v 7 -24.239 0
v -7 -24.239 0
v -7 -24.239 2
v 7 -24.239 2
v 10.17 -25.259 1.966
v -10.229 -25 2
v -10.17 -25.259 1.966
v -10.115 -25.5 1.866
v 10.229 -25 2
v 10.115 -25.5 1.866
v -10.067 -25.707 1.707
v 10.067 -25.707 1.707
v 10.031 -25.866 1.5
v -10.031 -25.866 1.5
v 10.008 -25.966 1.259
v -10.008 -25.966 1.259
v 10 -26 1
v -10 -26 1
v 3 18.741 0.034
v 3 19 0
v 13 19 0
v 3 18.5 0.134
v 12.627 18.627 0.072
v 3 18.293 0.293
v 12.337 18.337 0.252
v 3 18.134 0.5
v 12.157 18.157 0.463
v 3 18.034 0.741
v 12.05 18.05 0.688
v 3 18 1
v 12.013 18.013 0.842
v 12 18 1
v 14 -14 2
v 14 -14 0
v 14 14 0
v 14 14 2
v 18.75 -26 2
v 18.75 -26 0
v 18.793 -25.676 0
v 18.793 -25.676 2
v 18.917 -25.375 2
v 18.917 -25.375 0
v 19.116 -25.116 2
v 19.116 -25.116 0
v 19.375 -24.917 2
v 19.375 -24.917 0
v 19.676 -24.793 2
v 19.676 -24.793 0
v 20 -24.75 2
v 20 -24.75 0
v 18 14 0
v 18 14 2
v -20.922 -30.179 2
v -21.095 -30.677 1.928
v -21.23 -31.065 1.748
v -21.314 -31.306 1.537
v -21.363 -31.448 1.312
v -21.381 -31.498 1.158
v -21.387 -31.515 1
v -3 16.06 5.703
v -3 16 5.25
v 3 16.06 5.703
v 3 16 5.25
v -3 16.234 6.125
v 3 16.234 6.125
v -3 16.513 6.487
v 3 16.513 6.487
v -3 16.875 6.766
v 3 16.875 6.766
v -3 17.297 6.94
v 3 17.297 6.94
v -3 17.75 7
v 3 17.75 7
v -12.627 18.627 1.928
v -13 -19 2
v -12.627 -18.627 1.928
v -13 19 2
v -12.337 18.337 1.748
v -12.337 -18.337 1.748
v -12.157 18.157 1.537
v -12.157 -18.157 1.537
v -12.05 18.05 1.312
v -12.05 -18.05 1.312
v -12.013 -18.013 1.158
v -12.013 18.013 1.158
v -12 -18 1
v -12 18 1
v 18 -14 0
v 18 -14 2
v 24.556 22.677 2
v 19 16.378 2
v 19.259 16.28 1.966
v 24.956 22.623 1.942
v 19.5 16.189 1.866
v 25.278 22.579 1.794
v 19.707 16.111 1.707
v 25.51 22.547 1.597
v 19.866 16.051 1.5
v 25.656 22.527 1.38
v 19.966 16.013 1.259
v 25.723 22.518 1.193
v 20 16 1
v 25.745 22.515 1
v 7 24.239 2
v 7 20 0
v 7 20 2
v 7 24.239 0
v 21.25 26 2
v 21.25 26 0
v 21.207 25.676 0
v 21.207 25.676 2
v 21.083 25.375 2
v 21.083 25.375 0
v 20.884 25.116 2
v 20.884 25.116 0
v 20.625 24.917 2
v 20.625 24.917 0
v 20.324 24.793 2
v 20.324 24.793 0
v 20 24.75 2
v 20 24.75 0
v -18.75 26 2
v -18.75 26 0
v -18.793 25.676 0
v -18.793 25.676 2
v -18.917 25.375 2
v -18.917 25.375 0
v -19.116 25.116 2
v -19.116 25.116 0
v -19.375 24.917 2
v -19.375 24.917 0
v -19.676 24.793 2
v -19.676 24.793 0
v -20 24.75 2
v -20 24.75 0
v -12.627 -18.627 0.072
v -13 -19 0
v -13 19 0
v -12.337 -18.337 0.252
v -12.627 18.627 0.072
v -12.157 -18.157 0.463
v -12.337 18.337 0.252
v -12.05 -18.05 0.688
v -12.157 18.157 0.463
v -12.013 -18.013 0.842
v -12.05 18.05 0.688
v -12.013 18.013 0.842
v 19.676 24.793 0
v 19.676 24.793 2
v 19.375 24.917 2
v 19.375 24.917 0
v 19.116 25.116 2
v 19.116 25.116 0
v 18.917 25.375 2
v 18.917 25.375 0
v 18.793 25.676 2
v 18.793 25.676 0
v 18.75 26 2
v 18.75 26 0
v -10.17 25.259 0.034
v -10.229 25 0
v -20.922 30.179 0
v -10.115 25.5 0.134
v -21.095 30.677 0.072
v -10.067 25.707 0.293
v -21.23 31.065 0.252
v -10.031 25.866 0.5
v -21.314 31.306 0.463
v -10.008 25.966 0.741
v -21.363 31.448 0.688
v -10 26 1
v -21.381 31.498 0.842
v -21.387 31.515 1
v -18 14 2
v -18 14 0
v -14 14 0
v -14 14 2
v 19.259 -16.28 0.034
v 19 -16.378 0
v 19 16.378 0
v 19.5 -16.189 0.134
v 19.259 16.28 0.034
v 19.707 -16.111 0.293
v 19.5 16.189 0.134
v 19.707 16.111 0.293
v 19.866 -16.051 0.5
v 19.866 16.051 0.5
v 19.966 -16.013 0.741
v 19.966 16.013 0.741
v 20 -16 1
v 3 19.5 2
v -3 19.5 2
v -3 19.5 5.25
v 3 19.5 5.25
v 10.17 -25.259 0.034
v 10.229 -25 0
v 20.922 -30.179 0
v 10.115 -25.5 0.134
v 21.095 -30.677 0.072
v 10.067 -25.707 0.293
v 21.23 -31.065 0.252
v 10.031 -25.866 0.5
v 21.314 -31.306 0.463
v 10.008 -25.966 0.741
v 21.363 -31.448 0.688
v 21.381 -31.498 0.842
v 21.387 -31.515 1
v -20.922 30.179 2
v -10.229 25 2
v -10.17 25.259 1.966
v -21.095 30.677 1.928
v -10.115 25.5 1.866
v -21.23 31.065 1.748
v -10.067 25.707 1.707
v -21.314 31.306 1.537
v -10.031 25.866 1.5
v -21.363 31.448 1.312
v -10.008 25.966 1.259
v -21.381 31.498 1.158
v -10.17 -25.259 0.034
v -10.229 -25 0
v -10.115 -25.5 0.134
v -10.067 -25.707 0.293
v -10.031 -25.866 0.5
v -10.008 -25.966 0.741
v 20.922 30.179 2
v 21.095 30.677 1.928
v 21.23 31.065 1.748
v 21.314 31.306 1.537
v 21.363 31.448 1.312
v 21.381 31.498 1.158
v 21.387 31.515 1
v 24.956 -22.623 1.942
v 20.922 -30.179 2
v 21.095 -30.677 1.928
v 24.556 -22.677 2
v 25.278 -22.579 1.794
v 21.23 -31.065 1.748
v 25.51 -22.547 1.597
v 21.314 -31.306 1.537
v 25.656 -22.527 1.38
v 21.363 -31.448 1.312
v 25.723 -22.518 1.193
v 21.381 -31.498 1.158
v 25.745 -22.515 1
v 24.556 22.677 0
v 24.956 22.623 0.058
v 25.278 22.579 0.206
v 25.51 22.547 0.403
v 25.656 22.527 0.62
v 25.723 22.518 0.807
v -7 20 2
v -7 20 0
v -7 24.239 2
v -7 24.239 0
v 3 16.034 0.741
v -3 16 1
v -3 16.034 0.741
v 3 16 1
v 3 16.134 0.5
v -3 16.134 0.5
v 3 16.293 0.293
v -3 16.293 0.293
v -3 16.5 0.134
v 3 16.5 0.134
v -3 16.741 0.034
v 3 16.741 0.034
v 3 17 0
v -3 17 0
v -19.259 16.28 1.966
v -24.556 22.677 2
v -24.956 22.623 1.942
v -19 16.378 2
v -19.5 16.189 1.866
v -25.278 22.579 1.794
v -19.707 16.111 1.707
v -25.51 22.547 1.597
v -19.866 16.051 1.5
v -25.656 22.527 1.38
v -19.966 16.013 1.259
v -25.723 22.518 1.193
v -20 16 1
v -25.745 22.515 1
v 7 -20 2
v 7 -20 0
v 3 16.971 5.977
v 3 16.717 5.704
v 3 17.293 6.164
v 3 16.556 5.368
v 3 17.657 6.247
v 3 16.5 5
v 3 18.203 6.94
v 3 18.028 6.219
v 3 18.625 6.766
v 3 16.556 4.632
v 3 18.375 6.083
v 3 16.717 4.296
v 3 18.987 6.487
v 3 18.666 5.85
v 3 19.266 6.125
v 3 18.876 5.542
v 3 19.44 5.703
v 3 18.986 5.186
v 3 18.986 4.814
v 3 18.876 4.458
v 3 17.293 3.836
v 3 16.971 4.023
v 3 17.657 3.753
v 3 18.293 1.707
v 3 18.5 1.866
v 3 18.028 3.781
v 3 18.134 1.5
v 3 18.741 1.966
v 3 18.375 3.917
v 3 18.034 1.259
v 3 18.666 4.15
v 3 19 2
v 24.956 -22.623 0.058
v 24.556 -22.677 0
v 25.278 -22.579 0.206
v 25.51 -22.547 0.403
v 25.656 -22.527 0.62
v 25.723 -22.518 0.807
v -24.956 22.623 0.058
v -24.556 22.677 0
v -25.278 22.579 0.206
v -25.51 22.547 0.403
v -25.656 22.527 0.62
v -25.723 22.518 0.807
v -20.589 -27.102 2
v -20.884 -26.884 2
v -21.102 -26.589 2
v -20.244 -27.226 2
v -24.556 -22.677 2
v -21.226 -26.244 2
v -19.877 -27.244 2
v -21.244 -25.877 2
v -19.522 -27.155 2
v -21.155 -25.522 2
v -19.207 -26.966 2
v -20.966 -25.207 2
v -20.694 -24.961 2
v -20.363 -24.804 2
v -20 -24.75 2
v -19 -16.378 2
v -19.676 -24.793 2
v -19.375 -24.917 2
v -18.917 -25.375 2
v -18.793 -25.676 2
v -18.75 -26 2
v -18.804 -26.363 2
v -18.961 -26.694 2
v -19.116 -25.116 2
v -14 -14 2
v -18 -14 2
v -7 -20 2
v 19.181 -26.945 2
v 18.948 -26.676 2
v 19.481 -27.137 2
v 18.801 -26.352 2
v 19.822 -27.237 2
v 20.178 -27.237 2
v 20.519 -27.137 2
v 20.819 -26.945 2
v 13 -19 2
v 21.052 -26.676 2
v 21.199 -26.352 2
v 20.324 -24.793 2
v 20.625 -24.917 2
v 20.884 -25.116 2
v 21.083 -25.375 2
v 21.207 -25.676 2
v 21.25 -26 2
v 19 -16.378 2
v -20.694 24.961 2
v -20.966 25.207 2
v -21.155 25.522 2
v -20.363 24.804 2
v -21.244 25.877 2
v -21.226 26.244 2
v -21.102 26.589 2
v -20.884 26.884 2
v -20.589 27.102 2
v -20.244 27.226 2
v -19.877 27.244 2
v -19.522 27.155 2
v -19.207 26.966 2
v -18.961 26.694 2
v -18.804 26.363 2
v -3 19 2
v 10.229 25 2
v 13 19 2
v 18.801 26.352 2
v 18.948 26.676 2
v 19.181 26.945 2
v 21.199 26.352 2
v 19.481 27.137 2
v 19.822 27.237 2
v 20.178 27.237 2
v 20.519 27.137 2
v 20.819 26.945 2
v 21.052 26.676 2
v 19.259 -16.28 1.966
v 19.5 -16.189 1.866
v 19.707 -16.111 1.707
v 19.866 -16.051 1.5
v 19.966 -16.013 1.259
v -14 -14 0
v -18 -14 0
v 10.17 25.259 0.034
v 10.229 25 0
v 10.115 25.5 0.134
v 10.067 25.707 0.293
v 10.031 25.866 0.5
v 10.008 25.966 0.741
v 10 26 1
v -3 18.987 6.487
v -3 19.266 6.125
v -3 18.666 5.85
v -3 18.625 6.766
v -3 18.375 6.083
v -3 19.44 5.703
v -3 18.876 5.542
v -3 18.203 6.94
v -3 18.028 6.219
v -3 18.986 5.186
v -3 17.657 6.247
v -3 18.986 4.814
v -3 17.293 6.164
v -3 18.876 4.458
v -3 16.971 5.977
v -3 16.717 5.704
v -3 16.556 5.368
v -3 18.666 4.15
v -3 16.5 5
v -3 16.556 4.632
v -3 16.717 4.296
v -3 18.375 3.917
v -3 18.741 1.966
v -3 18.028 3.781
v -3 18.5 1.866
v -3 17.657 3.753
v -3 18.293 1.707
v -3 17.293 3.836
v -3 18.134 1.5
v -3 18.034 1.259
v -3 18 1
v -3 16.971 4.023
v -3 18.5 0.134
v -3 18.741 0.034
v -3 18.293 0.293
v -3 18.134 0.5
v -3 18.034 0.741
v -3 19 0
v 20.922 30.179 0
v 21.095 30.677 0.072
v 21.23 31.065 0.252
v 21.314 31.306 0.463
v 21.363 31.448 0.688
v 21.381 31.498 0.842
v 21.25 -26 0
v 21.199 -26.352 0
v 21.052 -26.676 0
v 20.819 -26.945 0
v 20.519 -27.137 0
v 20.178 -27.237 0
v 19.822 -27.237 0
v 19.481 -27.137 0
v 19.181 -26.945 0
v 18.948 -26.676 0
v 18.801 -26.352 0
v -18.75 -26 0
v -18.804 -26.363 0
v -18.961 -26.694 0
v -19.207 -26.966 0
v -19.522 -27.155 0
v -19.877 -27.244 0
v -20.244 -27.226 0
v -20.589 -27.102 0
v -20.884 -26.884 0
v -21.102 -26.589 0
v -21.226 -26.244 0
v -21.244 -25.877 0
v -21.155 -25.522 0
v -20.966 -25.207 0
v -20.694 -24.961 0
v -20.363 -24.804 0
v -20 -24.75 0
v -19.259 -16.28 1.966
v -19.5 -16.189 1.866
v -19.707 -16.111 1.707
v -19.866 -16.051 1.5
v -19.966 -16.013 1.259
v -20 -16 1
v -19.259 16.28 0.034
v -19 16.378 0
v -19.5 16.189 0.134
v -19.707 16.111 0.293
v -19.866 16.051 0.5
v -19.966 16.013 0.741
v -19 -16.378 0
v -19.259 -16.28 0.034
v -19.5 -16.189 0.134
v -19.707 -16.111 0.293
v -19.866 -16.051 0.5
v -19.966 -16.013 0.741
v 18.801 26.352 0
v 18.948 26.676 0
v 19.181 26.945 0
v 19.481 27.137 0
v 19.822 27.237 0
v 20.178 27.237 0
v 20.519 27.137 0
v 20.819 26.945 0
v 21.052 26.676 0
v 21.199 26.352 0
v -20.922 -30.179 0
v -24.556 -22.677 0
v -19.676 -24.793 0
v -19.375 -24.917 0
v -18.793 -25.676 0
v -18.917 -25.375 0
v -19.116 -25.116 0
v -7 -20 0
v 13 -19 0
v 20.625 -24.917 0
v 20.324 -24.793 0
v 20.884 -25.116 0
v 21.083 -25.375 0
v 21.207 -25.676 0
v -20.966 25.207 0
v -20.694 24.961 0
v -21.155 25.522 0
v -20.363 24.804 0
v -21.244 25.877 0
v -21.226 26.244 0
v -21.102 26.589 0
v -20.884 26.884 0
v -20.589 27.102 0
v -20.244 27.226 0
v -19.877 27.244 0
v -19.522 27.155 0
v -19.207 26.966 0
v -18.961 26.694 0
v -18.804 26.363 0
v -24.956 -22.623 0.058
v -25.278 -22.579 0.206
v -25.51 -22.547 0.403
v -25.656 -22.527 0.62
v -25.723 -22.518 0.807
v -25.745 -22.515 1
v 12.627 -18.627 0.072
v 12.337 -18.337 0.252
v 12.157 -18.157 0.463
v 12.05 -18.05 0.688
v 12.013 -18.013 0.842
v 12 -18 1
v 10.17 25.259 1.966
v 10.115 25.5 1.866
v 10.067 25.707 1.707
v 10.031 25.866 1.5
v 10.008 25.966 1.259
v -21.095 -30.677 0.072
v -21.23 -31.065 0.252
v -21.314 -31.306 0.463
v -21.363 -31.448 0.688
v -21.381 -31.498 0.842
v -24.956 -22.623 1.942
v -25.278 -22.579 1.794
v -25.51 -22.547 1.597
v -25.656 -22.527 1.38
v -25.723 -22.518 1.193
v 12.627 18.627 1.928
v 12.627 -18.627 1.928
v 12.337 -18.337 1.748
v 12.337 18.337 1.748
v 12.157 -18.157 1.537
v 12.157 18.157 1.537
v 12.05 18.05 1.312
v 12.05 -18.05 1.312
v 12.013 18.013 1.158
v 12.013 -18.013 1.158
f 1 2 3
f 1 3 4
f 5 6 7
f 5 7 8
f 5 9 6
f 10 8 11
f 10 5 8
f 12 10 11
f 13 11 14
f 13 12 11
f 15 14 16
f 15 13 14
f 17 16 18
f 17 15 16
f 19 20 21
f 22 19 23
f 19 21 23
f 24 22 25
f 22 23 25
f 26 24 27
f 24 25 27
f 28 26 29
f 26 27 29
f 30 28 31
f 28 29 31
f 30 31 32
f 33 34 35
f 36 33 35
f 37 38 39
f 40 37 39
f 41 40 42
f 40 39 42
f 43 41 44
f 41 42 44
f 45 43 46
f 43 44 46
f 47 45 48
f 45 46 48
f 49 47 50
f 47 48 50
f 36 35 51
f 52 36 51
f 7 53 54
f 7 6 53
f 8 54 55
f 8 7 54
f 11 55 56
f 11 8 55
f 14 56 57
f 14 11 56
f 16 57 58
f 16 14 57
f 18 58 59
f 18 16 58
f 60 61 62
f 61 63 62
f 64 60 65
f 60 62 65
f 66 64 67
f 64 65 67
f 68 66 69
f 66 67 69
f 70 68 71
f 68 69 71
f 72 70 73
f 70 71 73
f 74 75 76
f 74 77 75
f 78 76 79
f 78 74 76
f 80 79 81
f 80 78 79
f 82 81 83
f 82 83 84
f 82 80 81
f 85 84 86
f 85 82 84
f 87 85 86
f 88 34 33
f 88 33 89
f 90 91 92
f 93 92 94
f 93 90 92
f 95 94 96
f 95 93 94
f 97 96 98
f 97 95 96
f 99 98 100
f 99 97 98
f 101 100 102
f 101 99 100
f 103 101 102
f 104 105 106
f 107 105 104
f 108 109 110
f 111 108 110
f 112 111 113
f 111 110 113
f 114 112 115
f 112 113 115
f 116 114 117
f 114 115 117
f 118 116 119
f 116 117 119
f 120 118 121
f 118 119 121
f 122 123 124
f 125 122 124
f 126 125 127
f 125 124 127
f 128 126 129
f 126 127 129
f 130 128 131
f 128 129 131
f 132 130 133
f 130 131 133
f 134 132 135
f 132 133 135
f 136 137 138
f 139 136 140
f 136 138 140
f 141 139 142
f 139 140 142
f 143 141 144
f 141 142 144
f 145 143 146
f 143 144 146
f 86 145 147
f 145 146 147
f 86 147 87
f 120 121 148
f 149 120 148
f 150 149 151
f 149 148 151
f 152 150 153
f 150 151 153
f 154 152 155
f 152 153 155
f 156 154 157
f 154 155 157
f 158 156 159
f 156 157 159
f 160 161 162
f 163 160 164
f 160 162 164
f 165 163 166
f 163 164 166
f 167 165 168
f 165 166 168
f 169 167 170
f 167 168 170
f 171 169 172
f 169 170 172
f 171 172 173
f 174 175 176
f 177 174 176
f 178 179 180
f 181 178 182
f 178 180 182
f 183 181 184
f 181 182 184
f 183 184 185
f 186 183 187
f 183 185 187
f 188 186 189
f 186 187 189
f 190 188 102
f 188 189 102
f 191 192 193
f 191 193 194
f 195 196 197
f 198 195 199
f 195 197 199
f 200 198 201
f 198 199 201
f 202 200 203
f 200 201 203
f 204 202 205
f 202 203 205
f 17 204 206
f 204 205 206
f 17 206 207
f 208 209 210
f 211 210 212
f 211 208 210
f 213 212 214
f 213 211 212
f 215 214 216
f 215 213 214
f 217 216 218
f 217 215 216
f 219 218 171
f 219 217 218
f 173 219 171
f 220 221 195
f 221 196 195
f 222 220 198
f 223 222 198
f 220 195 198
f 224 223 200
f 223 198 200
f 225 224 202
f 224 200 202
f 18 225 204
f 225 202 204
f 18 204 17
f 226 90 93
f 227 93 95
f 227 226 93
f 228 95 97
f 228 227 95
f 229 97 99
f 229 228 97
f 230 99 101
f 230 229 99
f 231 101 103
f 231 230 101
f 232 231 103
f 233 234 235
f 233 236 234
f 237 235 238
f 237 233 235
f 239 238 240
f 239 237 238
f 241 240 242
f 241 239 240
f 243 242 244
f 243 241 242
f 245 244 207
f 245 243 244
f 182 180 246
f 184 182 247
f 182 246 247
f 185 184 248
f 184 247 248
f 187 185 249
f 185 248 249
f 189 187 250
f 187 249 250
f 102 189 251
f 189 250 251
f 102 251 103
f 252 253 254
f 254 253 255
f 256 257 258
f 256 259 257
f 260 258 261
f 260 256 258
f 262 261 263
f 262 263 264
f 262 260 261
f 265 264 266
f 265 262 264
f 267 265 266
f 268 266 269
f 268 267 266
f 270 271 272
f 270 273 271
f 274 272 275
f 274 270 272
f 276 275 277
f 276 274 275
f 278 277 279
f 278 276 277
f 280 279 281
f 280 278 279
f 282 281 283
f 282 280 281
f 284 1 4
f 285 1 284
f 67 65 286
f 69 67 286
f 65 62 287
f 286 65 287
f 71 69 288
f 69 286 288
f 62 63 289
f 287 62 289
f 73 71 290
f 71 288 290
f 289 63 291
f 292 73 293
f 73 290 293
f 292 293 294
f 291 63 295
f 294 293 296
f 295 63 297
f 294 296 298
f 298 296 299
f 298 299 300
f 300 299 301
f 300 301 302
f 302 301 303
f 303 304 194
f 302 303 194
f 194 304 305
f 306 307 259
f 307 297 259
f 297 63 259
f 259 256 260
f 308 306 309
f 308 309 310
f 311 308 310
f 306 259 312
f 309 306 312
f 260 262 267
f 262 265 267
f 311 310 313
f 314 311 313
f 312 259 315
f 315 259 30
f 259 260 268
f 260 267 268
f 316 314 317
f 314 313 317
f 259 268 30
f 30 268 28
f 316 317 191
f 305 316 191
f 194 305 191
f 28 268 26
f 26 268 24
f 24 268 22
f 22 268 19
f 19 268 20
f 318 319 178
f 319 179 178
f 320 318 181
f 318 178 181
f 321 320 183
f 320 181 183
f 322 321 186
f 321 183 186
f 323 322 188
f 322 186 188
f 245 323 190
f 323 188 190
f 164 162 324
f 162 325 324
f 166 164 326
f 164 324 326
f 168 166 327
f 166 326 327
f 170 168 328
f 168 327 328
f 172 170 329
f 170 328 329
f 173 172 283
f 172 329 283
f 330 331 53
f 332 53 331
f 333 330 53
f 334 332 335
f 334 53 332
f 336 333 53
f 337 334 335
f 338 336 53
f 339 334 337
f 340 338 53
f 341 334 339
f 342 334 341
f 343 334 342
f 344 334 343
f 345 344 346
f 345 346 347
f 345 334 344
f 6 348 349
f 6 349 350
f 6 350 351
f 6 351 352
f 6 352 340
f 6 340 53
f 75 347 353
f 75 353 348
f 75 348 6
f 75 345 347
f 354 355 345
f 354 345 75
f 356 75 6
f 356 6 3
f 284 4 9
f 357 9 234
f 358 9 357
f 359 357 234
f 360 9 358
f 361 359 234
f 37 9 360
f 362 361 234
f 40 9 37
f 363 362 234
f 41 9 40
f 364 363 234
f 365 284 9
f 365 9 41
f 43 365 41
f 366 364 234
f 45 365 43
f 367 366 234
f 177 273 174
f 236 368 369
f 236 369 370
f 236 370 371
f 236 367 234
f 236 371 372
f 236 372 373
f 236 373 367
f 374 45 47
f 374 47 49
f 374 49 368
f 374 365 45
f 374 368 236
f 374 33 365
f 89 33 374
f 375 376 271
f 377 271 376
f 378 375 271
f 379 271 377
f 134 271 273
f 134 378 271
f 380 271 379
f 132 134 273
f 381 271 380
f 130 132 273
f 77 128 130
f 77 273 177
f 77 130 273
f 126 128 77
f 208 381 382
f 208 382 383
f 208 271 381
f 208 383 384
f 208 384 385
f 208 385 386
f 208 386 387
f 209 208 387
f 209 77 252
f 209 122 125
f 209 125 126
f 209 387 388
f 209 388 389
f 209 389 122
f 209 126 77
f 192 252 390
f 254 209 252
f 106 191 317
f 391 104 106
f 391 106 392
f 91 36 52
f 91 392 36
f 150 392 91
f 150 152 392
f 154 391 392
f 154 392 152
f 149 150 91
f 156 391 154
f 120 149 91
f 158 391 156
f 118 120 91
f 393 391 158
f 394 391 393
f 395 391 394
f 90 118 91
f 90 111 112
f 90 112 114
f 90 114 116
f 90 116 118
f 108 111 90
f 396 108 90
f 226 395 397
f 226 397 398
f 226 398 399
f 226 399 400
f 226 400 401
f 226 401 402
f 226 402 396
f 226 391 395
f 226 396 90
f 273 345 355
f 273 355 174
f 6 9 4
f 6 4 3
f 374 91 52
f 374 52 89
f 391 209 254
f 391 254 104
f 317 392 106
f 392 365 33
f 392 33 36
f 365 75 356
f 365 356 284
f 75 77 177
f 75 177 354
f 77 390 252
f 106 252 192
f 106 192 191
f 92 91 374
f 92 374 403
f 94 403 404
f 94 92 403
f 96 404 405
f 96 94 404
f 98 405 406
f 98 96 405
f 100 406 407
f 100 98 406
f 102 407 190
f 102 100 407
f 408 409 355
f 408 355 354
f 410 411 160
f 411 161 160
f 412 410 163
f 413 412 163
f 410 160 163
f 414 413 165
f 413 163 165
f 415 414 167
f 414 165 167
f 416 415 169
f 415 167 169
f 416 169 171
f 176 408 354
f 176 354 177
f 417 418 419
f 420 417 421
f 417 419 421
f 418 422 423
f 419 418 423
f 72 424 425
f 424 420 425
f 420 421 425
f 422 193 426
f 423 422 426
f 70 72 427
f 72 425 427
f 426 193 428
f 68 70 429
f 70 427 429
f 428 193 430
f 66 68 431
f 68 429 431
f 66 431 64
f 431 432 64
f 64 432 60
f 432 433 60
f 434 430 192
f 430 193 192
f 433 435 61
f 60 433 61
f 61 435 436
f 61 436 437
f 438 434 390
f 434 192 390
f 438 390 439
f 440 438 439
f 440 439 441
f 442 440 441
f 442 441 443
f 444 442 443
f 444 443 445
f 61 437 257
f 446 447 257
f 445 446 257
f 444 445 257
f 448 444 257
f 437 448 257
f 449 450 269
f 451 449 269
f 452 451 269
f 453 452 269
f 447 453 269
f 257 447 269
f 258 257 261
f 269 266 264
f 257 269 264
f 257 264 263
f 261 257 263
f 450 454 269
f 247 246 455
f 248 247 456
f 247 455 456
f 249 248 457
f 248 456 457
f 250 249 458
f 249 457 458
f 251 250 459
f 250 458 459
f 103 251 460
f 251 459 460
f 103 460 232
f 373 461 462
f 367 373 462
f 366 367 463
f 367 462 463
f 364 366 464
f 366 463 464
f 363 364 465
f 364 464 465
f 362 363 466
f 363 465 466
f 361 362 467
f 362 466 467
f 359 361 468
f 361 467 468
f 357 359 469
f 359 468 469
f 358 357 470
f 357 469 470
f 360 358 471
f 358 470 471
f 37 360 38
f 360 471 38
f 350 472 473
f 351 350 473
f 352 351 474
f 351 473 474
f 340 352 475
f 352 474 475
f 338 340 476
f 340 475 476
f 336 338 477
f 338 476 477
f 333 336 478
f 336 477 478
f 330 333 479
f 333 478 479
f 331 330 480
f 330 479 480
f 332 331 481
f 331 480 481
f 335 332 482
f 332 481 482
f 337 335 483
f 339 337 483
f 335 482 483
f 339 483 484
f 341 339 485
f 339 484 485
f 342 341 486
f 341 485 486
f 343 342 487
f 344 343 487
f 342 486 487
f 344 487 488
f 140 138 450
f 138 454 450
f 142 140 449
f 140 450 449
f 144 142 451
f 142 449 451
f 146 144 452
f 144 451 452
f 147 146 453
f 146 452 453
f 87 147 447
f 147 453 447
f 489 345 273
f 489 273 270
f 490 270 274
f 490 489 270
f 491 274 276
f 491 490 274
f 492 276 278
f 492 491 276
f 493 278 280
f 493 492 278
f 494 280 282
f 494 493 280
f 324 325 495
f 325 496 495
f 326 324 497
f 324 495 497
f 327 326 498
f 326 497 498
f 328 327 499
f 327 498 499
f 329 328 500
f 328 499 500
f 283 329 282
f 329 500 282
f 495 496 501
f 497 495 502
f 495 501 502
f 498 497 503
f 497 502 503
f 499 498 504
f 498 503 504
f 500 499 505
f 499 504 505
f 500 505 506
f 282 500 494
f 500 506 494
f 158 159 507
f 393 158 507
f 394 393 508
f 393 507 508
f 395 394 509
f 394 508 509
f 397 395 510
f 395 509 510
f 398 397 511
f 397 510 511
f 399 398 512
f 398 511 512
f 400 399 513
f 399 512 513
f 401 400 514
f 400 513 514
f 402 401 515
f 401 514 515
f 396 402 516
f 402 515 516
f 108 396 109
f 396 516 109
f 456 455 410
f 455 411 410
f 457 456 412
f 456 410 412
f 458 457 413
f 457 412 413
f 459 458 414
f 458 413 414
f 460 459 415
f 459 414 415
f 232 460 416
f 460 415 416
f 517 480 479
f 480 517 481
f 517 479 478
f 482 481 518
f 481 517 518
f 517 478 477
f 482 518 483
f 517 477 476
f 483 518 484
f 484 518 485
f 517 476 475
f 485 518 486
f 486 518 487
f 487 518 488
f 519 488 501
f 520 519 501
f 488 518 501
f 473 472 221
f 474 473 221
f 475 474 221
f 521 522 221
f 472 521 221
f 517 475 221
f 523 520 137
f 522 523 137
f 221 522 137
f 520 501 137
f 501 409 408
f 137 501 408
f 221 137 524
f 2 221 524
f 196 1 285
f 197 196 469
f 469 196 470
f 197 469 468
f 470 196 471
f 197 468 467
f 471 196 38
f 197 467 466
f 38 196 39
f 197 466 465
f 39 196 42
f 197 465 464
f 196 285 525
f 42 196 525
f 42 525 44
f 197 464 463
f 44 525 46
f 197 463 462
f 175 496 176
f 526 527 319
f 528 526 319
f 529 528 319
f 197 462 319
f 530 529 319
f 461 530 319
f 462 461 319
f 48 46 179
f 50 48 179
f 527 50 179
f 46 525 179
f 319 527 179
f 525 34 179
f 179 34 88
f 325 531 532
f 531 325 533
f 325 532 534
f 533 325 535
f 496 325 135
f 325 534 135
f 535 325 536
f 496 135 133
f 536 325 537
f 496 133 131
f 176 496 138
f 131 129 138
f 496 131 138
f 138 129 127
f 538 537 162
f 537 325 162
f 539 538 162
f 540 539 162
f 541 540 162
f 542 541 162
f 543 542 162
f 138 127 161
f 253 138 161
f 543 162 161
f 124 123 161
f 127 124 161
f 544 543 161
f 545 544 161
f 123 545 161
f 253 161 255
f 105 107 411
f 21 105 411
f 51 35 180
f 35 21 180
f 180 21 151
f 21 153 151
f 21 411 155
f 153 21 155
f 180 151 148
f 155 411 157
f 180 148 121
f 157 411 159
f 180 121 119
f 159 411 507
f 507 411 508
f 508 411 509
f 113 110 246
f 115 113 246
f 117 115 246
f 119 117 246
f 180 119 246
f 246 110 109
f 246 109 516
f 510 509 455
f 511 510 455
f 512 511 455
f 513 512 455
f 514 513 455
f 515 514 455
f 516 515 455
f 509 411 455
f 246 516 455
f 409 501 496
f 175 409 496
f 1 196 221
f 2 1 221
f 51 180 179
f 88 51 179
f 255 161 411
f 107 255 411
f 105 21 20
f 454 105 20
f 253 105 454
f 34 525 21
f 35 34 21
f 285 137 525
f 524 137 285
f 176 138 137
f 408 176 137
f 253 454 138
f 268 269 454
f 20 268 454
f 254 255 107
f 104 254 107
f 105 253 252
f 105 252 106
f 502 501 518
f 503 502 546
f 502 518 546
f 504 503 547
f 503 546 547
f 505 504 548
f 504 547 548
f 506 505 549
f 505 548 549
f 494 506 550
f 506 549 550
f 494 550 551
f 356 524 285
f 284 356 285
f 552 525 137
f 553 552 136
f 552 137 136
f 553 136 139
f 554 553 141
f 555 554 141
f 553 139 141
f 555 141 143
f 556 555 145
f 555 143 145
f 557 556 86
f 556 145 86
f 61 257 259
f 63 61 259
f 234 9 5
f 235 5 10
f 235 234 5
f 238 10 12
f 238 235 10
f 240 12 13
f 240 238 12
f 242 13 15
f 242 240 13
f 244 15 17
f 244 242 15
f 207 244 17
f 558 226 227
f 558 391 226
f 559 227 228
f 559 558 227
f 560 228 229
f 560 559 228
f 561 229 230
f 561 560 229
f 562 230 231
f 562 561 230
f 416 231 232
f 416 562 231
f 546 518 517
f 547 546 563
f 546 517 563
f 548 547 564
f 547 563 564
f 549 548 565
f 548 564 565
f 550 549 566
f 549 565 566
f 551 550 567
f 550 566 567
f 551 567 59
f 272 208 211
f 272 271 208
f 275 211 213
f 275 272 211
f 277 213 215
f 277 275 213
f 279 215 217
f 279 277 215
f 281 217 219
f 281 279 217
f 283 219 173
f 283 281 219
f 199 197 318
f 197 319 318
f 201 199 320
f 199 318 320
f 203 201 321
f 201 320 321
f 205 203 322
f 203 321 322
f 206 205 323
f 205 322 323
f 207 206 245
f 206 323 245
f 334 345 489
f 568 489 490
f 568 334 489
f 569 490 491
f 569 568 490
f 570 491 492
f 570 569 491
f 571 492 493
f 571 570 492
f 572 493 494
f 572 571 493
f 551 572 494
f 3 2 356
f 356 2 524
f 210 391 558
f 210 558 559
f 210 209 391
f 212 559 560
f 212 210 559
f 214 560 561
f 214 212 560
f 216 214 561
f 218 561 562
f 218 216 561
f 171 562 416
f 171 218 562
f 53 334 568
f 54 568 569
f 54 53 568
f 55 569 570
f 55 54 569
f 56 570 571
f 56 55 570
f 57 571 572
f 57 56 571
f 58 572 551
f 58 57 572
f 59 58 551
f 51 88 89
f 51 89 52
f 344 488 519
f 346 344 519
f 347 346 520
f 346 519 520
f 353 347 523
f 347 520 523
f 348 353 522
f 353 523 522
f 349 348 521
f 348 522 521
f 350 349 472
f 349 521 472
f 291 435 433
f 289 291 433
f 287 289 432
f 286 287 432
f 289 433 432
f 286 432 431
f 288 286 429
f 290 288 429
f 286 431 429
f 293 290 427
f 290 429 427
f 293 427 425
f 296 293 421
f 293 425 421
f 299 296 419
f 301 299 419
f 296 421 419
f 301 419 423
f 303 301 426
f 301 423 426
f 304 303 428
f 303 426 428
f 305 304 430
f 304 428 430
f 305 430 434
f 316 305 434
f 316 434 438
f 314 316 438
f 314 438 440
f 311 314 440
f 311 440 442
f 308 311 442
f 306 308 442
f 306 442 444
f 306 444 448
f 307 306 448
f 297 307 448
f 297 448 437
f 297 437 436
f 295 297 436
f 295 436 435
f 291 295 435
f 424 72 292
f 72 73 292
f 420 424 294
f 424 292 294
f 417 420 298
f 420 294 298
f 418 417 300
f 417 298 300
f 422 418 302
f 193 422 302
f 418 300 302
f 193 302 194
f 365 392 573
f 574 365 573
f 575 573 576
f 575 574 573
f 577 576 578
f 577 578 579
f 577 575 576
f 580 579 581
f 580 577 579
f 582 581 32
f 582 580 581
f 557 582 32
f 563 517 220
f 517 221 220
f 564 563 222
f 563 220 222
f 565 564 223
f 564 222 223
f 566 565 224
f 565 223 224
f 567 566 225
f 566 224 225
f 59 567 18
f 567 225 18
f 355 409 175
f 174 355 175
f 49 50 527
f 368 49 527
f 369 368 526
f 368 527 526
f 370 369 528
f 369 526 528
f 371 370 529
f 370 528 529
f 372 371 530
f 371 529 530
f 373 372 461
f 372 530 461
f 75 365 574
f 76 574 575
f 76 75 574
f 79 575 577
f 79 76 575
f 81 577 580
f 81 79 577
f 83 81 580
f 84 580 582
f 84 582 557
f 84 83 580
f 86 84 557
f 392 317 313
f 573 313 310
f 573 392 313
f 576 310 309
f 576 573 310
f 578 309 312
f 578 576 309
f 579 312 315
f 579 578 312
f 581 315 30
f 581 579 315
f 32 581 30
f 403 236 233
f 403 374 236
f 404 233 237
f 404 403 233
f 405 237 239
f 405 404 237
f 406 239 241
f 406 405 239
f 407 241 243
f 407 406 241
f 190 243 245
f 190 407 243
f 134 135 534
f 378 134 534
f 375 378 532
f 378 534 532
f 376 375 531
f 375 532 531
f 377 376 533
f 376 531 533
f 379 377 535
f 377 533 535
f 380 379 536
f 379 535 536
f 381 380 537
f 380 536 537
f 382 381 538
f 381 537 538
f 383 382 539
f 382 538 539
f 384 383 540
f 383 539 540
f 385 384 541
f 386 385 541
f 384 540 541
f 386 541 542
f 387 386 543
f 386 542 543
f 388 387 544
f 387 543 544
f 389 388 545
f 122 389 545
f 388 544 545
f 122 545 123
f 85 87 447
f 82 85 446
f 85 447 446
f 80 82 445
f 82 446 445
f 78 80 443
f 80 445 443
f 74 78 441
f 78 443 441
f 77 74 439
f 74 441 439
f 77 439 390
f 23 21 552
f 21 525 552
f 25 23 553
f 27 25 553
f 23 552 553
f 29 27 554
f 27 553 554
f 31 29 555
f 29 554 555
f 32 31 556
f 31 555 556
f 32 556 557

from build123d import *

# Parameters (mm, degrees)
F0_W     = 14
F0_H     = 4.2391675711
F0_W_2   = 4
F0_H_2   = 28
F1_DEPTH = 2
F0_W_3   = 6
F0_H_3   = 2
F0_H_4   = 1.5
F2_DEPTH = 7
F3_R     = 1.74999
F4_R     = 1.25
F5_DEPTH = 25
F6_R     = 0.99999


# Not quite as in the source:
# - a fillet or chamfer is up to 0.001 mm smaller than in the source, because OpenCascade refuses the exact size
# - a feature names something its author has since deleted; it is built from what else it names


with BuildPart() as f1:
    # F0 (on Top) → F1 (new body)
    with BuildSketch(Plane.XY):
        with BuildLine():
            Line((-10, -26), (10, -26))
            ThreePointArc((10, -26), (12.9289321881, -18.9289321881), (20, -16))
            Line((20, -16), (20, 16))
            ThreePointArc((20, 16), (12.9289321881, 18.9289321881), (10, 26))
            Line((10, 26), (-10, 26))
            ThreePointArc((-10, 26), (-12.9289321881, 18.9289321881), (-20, 16))
            Line((-20, 16), (-20, -16))
            ThreePointArc((-20, -16), (-12.9289321881, -18.9289321881), (-10, -26))
        make_face()
        with Locations((0, -22.1195837855)):
            Rectangle(F0_W, F0_H, mode=Mode.SUBTRACT)
        with Locations((-16, 0)):
            Rectangle(F0_W_2, F0_H_2, mode=Mode.SUBTRACT)
        Polygon((3, 18), (10, 18), (12, 18), (12, -18), (-12, -18), (-12, 18), (-10, 18), (-3, 18), (-3, 19.5), (3, 19.5), align=None, mode=Mode.SUBTRACT)
        with Locations((16, 0)):
            Rectangle(F0_W_2, F0_H_2, mode=Mode.SUBTRACT)
        with Locations((0, 22.1195837855)):
            Rectangle(F0_W, F0_H, mode=Mode.SUBTRACT)
        with BuildLine():
            Line((-20, 24.75), (-20, 16))
            ThreePointArc((-20, 16), (-12.9289321881, 18.9289321881), (-10, 26))
            Line((-10, 26), (-18.75, 26))
            ThreePointArc((-18.75, 26), (-19.1161165235, 25.1161165235), (-20, 24.75))
        make_face()
        with BuildLine():
            Line((-25.7454968465, 22.5147810633), (-20, 16))
            Line((-20, 16), (-20, 24.75))
            ThreePointArc((-20, 24.75), (-20.8838834765, 26.8838834765), (-18.75, 26))
            Line((-18.75, 26), (-10, 26))
            Line((-10, 26), (-21.386597903, 31.5147810633))
            Line((-21.386597903, 31.5147810633), (-25.7454968465, 22.5147810633))
        make_face()
        with BuildLine():
            ThreePointArc((10, 26), (12.9289321881, 18.9289321881), (20, 16))
            Line((20, 16), (20, 24.75))
            ThreePointArc((20, 24.75), (19.1161165235, 25.1161165235), (18.75, 26))
            Line((18.75, 26), (10, 26))
        make_face()
        with BuildLine():
            Line((20, 24.75), (20, 16))
            Line((20, 16), (25.7454968465, 22.5147810633))
            Line((25.7454968465, 22.5147810633), (21.386597903, 31.5147810633))
            Line((21.386597903, 31.5147810633), (10, 26))
            Line((10, 26), (18.75, 26))
            ThreePointArc((18.75, 26), (20, 27.25), (21.25, 26))
            ThreePointArc((21.25, 26), (20.8838834765, 25.1161165235), (20, 24.75))
        make_face()
        with BuildLine():
            ThreePointArc((20, -16), (12.9289321881, -18.9289321881), (10, -26))
            Line((10, -26), (18.75, -26))
            ThreePointArc((18.75, -26), (19.1161165235, -25.1161165235), (20, -24.75))
            Line((20, -24.75), (20, -16))
        make_face()
        with BuildLine():
            Line((18.75, -26), (10, -26))
            Line((10, -26), (21.386597903, -31.5147810633))
            Line((21.386597903, -31.5147810633), (25.7454968465, -22.5147810633))
            Line((25.7454968465, -22.5147810633), (20, -16))
            Line((20, -16), (20, -24.75))
            ThreePointArc((20, -24.75), (20.8838834765, -25.1161165235), (21.25, -26))
            ThreePointArc((21.25, -26), (20, -27.25), (18.75, -26))
        make_face()
        with BuildLine():
            Line((-21.386597903, -31.5147810633), (-10, -26))
            Line((-10, -26), (-18.75, -26))
            ThreePointArc((-18.75, -26), (-20.8838834765, -26.8838834765), (-20, -24.75))
            Line((-20, -24.75), (-20, -16))
            Line((-20, -16), (-25.7454968465, -22.5147810633))
            Line((-25.7454968465, -22.5147810633), (-21.386597903, -31.5147810633))
        make_face()
        with BuildLine():
            Line((-18.75, -26), (-10, -26))
            ThreePointArc((-10, -26), (-12.9289321881, -18.9289321881), (-20, -16))
            Line((-20, -16), (-20, -24.75))
            ThreePointArc((-20, -24.75), (-19.1161165235, -25.1161165235), (-18.75, -26))
        make_face()
    extrude(amount=F1_DEPTH)

    # F0 (on Top) → F2 (join)
    with BuildSketch(Plane.XY):
        with Locations((0, 17)):
            Rectangle(F0_W_3, F0_H_3)
        with Locations((0, 18.75)):
            Rectangle(F0_W_3, F0_H_4)
    extrude(amount=F2_DEPTH)

    # F3 (radius 1.75 in the source; OpenCascade refuses exactly that, so slightly less here)
    f3_edges = [f1.edges().sort_by_distance(p)[0] for p in [
        (0, 16, 7),
        (0, 19.5, 7),
    ]]
    fillet(f3_edges, radius=F3_R)

    # F4 (on face) → F5 (cut)
    with BuildSketch(Plane(origin=(-3, 0, 0), x_dir=(0, -1, 0), z_dir=(-1, 0, 0))):
        with Locations((-17.75, 5)):
            Circle(F4_R)
    extrude(amount=-F5_DEPTH, mode=Mode.SUBTRACT)

    # F6 (radius 1 in the source; OpenCascade refuses exactly that, so slightly less here)
    f6_edges = [f1.edges().sort_by_distance(p)[0] for p in [
        (-20, 0, 2),
        (-23.566047, -27.014781, 2),
        (0, -26, 2),
        (20, 0, 2),
        (15.693299, 28.757391, 2),
        (0, 26, 2),
        (-23.566047, 27.014781, 2),
        (-23.566047, 27.014781, 0),
        (0, 26, 0),
        (15.693299, 28.757391, 0),
        (20, 0, 0),
        (-23.566047, -27.014781, 0),
        (0, -26, 0),
        (-20, 0, 0),
        (-12, 0, 2),
        (-7.5, 18, 2),
        (7.5, 18, 2),
        (12, 0, 2),
        (0, -18, 2),
        (0, 16, 0),
        (-12, 0, 0),
        (0, -18, 0),
        (12, 0, 0),
        (-22.872748, 19.257391, 2),
        (-22.872748, 19.257391, 0),
        (-15.693299, 28.757391, 2),
        (-15.693299, 28.757391, 0),
        (22.872748, 19.257391, 2),
        (22.872748, 19.257391, 0),
        (22.872748, -19.257391, 2),
        (22.872748, -19.257391, 0),
        (15.693299, -28.757391, 0),
        (15.693299, -28.757391, 2),
        (-15.693299, -28.757391, 0),
        (-15.693299, -28.757391, 2),
        (-22.872748, -19.257391, 0),
        (-22.872748, -19.257391, 2),
        (7.5, 18, 0),
        (-7.5, 18, 0),
        (23.566047, -27.014781, 2),
        (23.566047, -27.014781, 0),
        (23.566047, 27.014781, 2),
        (23.566047, 27.014781, 0),
    ]]
    fillet(f6_edges, radius=F6_R)


solid = f1.part
